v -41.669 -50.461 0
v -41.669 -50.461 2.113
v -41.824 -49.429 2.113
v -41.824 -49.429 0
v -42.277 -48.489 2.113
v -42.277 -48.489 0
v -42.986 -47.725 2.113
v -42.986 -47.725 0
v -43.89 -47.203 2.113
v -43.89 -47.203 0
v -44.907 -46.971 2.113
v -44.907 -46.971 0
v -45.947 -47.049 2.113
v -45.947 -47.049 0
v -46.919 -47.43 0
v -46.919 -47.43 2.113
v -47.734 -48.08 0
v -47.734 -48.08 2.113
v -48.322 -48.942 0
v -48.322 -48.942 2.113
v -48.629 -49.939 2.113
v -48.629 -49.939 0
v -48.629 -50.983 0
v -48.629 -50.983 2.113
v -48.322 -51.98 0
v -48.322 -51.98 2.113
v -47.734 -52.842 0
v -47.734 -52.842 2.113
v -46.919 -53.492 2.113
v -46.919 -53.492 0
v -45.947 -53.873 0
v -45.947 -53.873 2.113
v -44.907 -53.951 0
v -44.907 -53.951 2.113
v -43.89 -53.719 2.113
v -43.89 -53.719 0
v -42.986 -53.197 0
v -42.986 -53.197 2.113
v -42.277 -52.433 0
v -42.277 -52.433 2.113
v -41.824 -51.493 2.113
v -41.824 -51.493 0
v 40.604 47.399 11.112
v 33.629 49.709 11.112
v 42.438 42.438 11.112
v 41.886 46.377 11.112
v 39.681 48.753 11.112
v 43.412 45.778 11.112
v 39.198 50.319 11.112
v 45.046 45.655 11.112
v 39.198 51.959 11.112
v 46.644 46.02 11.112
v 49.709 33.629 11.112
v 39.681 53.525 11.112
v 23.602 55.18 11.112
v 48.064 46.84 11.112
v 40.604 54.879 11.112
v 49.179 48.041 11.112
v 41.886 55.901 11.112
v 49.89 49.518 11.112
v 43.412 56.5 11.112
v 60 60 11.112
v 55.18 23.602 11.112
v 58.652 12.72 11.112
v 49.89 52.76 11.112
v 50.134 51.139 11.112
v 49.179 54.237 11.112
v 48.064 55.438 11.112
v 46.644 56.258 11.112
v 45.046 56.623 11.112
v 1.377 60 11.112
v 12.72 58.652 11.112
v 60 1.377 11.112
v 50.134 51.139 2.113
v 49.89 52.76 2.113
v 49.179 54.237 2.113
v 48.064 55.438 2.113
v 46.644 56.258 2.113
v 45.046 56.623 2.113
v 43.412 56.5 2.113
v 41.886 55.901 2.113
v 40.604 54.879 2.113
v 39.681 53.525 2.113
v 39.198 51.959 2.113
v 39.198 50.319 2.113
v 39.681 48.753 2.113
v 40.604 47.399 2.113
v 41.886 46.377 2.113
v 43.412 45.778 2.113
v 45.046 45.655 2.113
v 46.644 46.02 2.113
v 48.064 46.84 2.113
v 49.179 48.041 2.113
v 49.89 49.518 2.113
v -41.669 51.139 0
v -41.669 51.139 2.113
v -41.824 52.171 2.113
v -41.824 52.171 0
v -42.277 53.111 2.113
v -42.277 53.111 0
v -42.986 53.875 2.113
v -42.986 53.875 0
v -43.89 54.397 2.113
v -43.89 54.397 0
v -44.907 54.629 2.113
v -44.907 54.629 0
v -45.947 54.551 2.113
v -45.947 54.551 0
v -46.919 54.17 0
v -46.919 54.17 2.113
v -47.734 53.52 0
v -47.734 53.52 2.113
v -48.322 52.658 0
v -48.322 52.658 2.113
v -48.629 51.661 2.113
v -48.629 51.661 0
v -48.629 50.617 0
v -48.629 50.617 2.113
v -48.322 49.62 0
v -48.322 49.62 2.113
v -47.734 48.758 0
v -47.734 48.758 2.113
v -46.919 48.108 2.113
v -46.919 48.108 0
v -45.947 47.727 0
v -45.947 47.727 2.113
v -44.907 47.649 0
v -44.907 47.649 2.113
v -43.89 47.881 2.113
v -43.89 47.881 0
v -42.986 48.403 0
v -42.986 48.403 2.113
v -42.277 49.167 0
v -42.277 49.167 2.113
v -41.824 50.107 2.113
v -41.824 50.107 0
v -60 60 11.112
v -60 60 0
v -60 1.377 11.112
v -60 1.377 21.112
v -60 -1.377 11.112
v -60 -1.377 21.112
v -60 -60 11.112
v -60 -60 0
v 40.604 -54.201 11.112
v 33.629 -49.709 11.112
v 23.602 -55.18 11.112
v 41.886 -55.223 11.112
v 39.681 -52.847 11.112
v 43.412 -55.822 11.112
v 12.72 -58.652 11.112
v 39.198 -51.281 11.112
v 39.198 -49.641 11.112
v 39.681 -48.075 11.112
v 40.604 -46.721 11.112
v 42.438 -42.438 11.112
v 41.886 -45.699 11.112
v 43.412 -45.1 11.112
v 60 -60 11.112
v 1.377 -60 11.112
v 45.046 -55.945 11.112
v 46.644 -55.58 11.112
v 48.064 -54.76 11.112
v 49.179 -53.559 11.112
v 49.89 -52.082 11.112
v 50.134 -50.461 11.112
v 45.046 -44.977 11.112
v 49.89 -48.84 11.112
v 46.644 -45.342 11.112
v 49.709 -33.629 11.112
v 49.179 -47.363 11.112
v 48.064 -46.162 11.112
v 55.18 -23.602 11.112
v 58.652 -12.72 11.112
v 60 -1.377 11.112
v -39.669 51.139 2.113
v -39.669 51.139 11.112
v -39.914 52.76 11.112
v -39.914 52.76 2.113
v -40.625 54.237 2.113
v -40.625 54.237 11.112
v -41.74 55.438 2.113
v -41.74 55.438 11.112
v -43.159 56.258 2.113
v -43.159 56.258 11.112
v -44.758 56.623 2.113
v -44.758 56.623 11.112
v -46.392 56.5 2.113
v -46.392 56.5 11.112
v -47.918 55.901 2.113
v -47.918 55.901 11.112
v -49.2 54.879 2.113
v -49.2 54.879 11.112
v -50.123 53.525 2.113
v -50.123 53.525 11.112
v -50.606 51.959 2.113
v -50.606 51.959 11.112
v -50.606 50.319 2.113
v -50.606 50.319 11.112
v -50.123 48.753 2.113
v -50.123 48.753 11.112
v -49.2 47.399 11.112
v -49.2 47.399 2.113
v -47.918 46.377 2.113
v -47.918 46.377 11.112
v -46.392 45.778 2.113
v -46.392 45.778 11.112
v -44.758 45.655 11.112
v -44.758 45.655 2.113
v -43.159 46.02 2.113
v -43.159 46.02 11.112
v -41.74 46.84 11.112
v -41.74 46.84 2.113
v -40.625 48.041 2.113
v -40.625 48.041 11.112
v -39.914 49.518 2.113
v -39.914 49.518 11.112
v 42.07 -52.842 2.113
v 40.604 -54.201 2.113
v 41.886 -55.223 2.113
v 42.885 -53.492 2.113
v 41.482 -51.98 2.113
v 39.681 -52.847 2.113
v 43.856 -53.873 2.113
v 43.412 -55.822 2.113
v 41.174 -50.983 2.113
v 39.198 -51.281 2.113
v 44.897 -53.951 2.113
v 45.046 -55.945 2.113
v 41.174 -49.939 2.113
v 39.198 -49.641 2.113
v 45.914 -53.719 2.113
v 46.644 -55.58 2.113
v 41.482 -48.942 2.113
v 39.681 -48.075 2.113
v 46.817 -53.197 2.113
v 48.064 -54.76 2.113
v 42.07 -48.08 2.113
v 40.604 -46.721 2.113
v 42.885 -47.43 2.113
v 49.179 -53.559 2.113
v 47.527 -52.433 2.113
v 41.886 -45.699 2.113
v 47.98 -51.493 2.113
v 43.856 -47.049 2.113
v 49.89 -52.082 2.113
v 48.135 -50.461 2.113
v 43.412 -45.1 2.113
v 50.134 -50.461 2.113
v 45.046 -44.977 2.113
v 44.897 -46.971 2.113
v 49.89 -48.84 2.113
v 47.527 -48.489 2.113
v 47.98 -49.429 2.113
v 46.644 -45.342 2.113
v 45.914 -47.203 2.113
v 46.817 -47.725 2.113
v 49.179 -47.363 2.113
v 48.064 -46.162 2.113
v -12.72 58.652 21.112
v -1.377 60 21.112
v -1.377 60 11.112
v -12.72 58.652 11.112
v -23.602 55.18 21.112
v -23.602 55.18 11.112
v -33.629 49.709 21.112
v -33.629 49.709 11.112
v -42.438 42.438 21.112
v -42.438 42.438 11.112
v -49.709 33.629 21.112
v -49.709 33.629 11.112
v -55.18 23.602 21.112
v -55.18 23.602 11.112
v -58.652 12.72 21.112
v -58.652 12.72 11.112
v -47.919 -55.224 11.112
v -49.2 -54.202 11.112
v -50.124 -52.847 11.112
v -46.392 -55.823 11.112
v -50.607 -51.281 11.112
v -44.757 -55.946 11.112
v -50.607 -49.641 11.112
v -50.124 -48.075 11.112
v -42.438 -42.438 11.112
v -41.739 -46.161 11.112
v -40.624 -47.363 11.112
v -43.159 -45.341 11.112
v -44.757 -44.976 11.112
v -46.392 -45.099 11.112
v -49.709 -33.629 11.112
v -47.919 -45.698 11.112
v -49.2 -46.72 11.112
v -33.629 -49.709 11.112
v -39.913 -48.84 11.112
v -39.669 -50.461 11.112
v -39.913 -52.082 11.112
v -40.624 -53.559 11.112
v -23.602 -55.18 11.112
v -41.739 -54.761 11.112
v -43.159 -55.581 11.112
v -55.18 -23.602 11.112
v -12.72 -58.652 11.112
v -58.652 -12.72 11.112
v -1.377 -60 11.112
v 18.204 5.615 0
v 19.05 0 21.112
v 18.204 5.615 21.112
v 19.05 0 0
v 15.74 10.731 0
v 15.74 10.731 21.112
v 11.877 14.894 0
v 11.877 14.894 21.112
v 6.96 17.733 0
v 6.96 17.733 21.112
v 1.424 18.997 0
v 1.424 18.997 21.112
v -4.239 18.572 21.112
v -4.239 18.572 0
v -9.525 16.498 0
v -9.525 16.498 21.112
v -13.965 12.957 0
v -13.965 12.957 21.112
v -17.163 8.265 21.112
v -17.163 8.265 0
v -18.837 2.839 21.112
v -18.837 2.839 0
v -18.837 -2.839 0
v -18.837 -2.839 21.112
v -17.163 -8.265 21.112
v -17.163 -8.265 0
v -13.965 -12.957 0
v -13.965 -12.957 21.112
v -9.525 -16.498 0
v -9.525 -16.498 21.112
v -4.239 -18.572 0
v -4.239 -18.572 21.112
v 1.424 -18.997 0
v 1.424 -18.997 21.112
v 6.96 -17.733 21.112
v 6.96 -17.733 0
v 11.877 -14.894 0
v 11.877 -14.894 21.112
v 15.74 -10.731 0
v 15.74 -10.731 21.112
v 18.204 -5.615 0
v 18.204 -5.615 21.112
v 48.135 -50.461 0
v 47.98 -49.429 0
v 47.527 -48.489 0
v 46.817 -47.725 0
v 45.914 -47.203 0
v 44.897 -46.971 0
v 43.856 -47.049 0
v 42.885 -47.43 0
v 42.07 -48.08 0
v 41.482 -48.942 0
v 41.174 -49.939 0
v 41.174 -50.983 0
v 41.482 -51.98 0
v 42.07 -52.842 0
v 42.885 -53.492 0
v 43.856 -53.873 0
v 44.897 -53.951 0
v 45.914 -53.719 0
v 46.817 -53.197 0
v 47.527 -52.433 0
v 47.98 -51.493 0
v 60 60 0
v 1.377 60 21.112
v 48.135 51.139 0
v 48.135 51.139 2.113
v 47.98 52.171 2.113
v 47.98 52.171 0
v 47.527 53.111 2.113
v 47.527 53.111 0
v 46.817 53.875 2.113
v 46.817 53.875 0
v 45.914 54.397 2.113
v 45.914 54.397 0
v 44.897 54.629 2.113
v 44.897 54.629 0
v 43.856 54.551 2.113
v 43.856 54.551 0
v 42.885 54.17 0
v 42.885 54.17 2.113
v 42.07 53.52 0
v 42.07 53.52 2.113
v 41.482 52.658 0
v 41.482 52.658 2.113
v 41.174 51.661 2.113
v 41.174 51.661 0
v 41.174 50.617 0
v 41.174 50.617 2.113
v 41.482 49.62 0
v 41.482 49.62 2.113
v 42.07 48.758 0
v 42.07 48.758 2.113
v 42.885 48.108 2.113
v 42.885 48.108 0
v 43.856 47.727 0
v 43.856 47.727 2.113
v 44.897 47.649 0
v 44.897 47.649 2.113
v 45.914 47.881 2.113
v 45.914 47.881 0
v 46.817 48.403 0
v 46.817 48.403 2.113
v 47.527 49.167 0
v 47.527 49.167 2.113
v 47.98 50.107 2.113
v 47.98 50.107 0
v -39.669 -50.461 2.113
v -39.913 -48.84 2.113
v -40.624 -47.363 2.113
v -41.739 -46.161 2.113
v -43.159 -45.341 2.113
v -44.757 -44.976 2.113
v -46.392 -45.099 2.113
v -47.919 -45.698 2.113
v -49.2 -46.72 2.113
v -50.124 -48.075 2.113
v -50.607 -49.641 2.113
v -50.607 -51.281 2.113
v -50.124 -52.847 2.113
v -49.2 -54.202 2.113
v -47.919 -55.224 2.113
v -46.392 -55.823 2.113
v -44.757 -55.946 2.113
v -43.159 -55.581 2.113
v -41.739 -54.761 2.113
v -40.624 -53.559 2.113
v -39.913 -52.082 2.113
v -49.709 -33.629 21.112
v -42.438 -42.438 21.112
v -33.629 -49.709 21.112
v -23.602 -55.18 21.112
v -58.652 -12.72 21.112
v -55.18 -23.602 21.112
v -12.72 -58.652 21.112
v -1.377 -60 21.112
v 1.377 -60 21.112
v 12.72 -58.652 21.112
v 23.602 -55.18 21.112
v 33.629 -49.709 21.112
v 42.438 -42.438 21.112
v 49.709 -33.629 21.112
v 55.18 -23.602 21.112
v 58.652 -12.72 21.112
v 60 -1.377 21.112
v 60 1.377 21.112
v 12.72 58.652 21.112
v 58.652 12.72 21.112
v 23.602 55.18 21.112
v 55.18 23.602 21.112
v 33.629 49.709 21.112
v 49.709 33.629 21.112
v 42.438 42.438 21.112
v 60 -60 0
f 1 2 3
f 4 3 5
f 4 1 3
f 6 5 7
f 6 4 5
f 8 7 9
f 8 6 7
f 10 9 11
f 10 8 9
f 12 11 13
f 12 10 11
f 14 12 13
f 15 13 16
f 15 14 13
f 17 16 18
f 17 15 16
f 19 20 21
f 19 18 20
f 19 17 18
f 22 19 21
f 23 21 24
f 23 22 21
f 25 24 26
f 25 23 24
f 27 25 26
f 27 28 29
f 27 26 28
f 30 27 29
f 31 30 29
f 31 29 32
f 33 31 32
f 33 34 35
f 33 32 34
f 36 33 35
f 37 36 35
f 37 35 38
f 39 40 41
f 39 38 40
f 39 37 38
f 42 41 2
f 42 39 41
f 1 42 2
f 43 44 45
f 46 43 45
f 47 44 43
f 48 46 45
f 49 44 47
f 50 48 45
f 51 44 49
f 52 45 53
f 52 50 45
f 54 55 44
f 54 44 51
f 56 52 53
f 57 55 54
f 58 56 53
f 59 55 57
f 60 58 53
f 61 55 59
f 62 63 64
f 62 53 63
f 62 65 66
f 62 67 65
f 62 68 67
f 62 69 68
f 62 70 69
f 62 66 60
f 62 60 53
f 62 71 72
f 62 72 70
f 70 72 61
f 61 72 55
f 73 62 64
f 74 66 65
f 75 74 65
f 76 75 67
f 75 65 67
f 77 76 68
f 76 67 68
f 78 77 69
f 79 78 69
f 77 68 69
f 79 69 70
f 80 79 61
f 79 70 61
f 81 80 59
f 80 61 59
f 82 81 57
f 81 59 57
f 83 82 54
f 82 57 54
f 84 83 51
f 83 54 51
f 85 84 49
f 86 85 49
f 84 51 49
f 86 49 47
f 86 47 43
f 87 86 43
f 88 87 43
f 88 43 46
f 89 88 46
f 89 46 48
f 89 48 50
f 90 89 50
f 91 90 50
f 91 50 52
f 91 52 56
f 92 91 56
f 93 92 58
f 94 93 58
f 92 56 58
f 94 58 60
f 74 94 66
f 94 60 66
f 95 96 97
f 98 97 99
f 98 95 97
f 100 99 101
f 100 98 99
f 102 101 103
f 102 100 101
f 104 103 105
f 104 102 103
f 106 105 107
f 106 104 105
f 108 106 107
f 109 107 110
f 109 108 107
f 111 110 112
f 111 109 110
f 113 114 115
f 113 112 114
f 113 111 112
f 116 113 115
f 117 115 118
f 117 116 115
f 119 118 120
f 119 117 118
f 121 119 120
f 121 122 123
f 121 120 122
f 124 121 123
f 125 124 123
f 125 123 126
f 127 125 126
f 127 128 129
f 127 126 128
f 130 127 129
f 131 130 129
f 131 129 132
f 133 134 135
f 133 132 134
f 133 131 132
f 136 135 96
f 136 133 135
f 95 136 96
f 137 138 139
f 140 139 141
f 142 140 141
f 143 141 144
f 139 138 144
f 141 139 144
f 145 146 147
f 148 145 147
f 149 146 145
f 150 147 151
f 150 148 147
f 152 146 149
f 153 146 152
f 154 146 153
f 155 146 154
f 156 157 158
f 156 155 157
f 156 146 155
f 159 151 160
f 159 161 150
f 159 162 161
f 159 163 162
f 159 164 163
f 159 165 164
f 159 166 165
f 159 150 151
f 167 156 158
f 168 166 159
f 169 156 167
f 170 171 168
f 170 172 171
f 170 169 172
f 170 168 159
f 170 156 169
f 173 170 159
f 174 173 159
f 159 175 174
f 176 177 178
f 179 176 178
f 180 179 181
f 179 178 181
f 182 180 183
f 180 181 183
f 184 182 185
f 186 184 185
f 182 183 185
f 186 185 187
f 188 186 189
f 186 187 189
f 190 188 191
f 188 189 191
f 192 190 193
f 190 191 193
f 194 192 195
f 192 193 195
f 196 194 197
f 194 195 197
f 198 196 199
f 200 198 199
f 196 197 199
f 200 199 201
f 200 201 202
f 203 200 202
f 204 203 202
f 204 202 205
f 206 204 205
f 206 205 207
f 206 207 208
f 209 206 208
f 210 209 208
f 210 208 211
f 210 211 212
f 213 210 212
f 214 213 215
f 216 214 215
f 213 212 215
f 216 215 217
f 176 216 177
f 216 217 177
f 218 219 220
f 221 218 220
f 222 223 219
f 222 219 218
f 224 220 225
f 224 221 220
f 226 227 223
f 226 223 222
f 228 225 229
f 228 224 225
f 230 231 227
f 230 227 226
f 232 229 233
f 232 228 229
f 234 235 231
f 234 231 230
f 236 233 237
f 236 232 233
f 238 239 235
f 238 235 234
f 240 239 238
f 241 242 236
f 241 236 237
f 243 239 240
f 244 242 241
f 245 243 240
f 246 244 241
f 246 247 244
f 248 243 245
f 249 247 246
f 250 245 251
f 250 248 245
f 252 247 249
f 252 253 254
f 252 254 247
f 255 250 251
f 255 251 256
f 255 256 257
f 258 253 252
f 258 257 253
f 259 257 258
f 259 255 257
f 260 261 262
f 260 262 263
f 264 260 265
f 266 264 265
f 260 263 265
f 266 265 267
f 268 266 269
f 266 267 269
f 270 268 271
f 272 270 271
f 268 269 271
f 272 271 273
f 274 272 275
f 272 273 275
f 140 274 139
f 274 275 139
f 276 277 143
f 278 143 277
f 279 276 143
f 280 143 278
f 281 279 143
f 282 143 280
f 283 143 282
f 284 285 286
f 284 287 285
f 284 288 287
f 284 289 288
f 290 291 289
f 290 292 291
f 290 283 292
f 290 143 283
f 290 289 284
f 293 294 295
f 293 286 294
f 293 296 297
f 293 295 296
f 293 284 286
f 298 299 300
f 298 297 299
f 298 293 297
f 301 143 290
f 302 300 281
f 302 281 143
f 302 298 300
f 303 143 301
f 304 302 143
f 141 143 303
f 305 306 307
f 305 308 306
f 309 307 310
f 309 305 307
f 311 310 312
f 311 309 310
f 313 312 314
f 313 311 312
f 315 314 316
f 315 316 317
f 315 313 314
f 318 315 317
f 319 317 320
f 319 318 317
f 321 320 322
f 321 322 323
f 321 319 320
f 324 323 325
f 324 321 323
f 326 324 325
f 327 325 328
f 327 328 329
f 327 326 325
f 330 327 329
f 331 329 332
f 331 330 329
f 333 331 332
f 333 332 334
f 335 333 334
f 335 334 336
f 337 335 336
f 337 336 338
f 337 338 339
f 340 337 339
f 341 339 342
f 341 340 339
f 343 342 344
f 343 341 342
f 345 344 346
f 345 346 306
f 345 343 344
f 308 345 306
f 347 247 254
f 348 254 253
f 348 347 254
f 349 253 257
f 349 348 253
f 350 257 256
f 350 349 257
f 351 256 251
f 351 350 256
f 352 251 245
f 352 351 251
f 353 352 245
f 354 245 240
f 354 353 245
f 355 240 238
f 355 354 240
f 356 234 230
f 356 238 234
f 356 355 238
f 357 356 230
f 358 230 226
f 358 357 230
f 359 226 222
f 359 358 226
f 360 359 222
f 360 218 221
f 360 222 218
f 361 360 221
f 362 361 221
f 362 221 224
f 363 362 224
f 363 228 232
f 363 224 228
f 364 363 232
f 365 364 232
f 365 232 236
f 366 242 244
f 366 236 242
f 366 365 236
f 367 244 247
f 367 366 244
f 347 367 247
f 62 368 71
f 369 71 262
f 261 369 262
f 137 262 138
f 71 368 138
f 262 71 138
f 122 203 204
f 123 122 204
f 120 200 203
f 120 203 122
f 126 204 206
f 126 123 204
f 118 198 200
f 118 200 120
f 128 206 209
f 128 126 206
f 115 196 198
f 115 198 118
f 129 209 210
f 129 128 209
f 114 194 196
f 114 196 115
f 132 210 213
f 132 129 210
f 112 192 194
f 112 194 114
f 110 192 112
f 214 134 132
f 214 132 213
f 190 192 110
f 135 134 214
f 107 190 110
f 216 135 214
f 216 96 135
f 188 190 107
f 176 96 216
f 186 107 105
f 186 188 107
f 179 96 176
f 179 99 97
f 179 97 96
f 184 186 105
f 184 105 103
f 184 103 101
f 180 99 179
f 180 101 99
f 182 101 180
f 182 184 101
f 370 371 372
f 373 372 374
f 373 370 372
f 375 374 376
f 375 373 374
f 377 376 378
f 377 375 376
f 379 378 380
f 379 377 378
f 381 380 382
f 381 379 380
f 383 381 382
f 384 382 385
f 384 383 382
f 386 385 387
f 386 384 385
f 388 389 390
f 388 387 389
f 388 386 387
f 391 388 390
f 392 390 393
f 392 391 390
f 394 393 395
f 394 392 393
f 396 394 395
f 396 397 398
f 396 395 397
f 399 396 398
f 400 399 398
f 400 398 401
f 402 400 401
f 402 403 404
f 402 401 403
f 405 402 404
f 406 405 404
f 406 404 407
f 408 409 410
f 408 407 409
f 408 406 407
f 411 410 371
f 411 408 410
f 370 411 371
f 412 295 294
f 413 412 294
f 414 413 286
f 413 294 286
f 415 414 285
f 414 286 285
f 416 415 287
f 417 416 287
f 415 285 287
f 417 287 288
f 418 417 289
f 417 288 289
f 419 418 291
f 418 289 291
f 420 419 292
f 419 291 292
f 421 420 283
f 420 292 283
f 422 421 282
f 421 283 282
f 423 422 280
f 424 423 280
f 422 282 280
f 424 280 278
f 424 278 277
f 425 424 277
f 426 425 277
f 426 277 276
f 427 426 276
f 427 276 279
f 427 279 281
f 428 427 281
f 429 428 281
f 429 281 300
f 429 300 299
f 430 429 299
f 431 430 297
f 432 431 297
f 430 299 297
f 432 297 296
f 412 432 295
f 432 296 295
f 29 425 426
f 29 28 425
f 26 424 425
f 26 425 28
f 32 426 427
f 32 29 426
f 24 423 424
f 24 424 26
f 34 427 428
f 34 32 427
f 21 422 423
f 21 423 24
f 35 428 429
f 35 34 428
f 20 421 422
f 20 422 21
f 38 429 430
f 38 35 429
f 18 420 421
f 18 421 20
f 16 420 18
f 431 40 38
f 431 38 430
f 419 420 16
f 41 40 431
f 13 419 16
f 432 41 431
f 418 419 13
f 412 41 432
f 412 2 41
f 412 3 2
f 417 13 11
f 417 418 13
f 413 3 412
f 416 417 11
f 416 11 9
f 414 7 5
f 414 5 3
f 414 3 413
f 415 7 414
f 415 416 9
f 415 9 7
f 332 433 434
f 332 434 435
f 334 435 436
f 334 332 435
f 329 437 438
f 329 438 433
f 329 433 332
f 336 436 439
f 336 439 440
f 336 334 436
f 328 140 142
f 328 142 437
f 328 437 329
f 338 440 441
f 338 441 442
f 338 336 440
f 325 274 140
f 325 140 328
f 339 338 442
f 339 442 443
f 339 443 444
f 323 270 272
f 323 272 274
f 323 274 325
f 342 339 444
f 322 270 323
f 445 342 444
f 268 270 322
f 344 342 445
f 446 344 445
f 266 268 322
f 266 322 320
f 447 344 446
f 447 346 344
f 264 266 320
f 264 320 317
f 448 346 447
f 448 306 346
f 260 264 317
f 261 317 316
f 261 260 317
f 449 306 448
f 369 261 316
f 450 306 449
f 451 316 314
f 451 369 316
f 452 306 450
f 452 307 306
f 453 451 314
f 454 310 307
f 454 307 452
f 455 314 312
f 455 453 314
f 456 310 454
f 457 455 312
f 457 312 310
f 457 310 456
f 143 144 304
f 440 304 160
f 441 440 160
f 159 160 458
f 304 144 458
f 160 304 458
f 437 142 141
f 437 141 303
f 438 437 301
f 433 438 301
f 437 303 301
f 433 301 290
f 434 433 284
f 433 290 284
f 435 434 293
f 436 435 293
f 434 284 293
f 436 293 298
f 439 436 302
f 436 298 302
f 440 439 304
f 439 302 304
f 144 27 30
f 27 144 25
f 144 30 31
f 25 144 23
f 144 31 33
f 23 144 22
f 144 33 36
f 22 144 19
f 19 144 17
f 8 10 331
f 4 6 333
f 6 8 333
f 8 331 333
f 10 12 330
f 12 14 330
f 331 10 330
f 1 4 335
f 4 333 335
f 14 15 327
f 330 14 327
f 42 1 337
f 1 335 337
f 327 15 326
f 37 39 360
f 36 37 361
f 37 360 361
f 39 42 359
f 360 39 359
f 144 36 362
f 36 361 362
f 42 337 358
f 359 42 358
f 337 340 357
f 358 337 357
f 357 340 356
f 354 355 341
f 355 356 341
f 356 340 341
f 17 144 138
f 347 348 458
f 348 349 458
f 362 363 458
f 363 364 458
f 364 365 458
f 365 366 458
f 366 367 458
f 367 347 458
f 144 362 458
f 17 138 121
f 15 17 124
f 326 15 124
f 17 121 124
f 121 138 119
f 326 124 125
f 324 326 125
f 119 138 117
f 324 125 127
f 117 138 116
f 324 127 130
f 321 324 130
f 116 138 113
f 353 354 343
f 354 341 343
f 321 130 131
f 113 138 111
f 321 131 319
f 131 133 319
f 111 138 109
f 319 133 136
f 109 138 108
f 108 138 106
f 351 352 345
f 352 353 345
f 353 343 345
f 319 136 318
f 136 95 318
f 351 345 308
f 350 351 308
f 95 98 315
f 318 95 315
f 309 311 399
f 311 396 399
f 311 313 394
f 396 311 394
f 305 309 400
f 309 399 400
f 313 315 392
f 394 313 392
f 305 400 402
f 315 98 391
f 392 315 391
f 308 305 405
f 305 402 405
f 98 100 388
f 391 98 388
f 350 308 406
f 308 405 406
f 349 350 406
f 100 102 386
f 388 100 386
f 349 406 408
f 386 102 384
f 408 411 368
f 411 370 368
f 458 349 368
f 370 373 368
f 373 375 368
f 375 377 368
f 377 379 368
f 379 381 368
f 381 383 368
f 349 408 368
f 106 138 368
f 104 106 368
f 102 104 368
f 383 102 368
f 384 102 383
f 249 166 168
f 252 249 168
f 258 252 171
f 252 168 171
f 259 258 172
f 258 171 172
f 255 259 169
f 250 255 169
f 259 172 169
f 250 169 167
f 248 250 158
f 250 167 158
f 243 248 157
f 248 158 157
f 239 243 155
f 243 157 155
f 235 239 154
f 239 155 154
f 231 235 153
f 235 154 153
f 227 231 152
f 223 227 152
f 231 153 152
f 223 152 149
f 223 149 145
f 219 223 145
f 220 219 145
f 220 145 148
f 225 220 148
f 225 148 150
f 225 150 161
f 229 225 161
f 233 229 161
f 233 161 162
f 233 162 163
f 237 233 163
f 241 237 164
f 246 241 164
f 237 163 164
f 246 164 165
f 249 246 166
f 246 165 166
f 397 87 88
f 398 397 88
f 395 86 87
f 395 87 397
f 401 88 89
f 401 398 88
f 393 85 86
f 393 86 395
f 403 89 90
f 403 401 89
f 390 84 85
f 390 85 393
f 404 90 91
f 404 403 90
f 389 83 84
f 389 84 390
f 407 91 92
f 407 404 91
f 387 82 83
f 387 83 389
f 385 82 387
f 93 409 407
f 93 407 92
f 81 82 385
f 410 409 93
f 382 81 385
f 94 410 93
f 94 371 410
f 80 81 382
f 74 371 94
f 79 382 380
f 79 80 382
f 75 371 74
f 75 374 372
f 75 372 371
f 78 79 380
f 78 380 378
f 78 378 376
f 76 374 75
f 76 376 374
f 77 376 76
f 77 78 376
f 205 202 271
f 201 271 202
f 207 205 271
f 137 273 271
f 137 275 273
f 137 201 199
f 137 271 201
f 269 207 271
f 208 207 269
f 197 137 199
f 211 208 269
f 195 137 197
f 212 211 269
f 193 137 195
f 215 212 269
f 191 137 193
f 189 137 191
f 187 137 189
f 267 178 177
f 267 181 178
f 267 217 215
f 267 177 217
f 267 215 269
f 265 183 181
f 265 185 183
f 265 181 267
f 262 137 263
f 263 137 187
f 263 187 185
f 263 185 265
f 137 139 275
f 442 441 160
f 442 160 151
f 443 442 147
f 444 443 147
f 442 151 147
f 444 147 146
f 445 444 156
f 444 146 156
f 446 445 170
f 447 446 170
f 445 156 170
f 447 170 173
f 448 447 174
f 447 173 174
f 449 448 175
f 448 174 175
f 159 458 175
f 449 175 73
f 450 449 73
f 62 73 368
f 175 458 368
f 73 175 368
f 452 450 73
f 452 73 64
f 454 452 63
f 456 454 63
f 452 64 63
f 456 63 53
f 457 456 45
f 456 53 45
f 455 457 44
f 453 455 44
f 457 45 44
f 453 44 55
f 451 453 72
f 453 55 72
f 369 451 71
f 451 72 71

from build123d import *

# Parameters (mm, degrees)
F0_R     = 3.5
F0_R_2   = 19.05
F1_DEPTH = 11.1125
F2_R     = 5.5
F2_R_2   = 5.4991
F3_DEPTH = 9
F4_R     = 19.05
F5_DEPTH = 10


# Not quite as in the source:
# - a length typed as a fraction of an inch, garbled in the dataset ("3 / 203.2 mm" for 3/8 in), is restored


with BuildPart() as f1:
    # F0 (on Top) → F1 (new body)
    with BuildSketch(Plane.XY):
        Polygon((0, 60), (-60, 60), (-60, -60), (60, -60), (60, 0), (60, 60), align=None)
        with Locations((-45.1685115695, -50.4610737026)):
            Circle(F0_R, mode=Mode.SUBTRACT)
        with Locations((44.6352420051, -50.4610737026)):
            Circle(F0_R, mode=Mode.SUBTRACT)
        with Locations((-45.1685115695, 51.1389262974)):
            Circle(F0_R, mode=Mode.SUBTRACT)
        Circle(F0_R_2, mode=Mode.SUBTRACT)
        with Locations((44.6352420051, 51.1389262974)):
            Circle(F0_R, mode=Mode.SUBTRACT)
    extrude(amount=F1_DEPTH)

    # F2 (on face) → F3 (cut)
    with BuildSketch(Plane.XY.offset(11.1125)):
        with Locations((-45.1685115695, -50.4610737026)):
            Circle(F2_R)
        with Locations((44.6352420051, -50.4610737026)):
            Circle(F2_R_2)
        with Locations((44.6352420051, 51.1389262974)):
            Circle(F2_R_2)
        with Locations((-45.1685115695, 51.1389262974)):
            Circle(F2_R_2)
    extrude(amount=-F3_DEPTH, mode=Mode.SUBTRACT)

    # F4 (on face) → F5 (join)
    with BuildSketch(Plane.XY.offset(11.1125)):
        with BuildLine():
            Line((60, -1.3768154949), (60, 1.3768154949))
            ThreePointArc((60, 1.3768154949), (42.4375754545, 42.4375754545), (1.3768154949, 60))
            Line((1.3768154949, 60), (-1.3768154949, 60))
            ThreePointArc((-1.3768154949, 60), (-42.4375754545, 42.4375754545), (-60, 1.3768154949))
            Line((-60, 1.3768154949), (-60, -1.3768154949))
            ThreePointArc((-60, -1.3768154949), (-42.4375754545, -42.4375754545), (-1.3768154949, -60))
            Line((-1.3768154949, -60), (1.3768154949, -60))
            ThreePointArc((1.3768154949, -60), (42.4375754545, -42.4375754545), (60, -1.3768154949))
        make_face()
        Circle(F4_R, mode=Mode.SUBTRACT)
    extrude(amount=F5_DEPTH)


solid = f1.part
